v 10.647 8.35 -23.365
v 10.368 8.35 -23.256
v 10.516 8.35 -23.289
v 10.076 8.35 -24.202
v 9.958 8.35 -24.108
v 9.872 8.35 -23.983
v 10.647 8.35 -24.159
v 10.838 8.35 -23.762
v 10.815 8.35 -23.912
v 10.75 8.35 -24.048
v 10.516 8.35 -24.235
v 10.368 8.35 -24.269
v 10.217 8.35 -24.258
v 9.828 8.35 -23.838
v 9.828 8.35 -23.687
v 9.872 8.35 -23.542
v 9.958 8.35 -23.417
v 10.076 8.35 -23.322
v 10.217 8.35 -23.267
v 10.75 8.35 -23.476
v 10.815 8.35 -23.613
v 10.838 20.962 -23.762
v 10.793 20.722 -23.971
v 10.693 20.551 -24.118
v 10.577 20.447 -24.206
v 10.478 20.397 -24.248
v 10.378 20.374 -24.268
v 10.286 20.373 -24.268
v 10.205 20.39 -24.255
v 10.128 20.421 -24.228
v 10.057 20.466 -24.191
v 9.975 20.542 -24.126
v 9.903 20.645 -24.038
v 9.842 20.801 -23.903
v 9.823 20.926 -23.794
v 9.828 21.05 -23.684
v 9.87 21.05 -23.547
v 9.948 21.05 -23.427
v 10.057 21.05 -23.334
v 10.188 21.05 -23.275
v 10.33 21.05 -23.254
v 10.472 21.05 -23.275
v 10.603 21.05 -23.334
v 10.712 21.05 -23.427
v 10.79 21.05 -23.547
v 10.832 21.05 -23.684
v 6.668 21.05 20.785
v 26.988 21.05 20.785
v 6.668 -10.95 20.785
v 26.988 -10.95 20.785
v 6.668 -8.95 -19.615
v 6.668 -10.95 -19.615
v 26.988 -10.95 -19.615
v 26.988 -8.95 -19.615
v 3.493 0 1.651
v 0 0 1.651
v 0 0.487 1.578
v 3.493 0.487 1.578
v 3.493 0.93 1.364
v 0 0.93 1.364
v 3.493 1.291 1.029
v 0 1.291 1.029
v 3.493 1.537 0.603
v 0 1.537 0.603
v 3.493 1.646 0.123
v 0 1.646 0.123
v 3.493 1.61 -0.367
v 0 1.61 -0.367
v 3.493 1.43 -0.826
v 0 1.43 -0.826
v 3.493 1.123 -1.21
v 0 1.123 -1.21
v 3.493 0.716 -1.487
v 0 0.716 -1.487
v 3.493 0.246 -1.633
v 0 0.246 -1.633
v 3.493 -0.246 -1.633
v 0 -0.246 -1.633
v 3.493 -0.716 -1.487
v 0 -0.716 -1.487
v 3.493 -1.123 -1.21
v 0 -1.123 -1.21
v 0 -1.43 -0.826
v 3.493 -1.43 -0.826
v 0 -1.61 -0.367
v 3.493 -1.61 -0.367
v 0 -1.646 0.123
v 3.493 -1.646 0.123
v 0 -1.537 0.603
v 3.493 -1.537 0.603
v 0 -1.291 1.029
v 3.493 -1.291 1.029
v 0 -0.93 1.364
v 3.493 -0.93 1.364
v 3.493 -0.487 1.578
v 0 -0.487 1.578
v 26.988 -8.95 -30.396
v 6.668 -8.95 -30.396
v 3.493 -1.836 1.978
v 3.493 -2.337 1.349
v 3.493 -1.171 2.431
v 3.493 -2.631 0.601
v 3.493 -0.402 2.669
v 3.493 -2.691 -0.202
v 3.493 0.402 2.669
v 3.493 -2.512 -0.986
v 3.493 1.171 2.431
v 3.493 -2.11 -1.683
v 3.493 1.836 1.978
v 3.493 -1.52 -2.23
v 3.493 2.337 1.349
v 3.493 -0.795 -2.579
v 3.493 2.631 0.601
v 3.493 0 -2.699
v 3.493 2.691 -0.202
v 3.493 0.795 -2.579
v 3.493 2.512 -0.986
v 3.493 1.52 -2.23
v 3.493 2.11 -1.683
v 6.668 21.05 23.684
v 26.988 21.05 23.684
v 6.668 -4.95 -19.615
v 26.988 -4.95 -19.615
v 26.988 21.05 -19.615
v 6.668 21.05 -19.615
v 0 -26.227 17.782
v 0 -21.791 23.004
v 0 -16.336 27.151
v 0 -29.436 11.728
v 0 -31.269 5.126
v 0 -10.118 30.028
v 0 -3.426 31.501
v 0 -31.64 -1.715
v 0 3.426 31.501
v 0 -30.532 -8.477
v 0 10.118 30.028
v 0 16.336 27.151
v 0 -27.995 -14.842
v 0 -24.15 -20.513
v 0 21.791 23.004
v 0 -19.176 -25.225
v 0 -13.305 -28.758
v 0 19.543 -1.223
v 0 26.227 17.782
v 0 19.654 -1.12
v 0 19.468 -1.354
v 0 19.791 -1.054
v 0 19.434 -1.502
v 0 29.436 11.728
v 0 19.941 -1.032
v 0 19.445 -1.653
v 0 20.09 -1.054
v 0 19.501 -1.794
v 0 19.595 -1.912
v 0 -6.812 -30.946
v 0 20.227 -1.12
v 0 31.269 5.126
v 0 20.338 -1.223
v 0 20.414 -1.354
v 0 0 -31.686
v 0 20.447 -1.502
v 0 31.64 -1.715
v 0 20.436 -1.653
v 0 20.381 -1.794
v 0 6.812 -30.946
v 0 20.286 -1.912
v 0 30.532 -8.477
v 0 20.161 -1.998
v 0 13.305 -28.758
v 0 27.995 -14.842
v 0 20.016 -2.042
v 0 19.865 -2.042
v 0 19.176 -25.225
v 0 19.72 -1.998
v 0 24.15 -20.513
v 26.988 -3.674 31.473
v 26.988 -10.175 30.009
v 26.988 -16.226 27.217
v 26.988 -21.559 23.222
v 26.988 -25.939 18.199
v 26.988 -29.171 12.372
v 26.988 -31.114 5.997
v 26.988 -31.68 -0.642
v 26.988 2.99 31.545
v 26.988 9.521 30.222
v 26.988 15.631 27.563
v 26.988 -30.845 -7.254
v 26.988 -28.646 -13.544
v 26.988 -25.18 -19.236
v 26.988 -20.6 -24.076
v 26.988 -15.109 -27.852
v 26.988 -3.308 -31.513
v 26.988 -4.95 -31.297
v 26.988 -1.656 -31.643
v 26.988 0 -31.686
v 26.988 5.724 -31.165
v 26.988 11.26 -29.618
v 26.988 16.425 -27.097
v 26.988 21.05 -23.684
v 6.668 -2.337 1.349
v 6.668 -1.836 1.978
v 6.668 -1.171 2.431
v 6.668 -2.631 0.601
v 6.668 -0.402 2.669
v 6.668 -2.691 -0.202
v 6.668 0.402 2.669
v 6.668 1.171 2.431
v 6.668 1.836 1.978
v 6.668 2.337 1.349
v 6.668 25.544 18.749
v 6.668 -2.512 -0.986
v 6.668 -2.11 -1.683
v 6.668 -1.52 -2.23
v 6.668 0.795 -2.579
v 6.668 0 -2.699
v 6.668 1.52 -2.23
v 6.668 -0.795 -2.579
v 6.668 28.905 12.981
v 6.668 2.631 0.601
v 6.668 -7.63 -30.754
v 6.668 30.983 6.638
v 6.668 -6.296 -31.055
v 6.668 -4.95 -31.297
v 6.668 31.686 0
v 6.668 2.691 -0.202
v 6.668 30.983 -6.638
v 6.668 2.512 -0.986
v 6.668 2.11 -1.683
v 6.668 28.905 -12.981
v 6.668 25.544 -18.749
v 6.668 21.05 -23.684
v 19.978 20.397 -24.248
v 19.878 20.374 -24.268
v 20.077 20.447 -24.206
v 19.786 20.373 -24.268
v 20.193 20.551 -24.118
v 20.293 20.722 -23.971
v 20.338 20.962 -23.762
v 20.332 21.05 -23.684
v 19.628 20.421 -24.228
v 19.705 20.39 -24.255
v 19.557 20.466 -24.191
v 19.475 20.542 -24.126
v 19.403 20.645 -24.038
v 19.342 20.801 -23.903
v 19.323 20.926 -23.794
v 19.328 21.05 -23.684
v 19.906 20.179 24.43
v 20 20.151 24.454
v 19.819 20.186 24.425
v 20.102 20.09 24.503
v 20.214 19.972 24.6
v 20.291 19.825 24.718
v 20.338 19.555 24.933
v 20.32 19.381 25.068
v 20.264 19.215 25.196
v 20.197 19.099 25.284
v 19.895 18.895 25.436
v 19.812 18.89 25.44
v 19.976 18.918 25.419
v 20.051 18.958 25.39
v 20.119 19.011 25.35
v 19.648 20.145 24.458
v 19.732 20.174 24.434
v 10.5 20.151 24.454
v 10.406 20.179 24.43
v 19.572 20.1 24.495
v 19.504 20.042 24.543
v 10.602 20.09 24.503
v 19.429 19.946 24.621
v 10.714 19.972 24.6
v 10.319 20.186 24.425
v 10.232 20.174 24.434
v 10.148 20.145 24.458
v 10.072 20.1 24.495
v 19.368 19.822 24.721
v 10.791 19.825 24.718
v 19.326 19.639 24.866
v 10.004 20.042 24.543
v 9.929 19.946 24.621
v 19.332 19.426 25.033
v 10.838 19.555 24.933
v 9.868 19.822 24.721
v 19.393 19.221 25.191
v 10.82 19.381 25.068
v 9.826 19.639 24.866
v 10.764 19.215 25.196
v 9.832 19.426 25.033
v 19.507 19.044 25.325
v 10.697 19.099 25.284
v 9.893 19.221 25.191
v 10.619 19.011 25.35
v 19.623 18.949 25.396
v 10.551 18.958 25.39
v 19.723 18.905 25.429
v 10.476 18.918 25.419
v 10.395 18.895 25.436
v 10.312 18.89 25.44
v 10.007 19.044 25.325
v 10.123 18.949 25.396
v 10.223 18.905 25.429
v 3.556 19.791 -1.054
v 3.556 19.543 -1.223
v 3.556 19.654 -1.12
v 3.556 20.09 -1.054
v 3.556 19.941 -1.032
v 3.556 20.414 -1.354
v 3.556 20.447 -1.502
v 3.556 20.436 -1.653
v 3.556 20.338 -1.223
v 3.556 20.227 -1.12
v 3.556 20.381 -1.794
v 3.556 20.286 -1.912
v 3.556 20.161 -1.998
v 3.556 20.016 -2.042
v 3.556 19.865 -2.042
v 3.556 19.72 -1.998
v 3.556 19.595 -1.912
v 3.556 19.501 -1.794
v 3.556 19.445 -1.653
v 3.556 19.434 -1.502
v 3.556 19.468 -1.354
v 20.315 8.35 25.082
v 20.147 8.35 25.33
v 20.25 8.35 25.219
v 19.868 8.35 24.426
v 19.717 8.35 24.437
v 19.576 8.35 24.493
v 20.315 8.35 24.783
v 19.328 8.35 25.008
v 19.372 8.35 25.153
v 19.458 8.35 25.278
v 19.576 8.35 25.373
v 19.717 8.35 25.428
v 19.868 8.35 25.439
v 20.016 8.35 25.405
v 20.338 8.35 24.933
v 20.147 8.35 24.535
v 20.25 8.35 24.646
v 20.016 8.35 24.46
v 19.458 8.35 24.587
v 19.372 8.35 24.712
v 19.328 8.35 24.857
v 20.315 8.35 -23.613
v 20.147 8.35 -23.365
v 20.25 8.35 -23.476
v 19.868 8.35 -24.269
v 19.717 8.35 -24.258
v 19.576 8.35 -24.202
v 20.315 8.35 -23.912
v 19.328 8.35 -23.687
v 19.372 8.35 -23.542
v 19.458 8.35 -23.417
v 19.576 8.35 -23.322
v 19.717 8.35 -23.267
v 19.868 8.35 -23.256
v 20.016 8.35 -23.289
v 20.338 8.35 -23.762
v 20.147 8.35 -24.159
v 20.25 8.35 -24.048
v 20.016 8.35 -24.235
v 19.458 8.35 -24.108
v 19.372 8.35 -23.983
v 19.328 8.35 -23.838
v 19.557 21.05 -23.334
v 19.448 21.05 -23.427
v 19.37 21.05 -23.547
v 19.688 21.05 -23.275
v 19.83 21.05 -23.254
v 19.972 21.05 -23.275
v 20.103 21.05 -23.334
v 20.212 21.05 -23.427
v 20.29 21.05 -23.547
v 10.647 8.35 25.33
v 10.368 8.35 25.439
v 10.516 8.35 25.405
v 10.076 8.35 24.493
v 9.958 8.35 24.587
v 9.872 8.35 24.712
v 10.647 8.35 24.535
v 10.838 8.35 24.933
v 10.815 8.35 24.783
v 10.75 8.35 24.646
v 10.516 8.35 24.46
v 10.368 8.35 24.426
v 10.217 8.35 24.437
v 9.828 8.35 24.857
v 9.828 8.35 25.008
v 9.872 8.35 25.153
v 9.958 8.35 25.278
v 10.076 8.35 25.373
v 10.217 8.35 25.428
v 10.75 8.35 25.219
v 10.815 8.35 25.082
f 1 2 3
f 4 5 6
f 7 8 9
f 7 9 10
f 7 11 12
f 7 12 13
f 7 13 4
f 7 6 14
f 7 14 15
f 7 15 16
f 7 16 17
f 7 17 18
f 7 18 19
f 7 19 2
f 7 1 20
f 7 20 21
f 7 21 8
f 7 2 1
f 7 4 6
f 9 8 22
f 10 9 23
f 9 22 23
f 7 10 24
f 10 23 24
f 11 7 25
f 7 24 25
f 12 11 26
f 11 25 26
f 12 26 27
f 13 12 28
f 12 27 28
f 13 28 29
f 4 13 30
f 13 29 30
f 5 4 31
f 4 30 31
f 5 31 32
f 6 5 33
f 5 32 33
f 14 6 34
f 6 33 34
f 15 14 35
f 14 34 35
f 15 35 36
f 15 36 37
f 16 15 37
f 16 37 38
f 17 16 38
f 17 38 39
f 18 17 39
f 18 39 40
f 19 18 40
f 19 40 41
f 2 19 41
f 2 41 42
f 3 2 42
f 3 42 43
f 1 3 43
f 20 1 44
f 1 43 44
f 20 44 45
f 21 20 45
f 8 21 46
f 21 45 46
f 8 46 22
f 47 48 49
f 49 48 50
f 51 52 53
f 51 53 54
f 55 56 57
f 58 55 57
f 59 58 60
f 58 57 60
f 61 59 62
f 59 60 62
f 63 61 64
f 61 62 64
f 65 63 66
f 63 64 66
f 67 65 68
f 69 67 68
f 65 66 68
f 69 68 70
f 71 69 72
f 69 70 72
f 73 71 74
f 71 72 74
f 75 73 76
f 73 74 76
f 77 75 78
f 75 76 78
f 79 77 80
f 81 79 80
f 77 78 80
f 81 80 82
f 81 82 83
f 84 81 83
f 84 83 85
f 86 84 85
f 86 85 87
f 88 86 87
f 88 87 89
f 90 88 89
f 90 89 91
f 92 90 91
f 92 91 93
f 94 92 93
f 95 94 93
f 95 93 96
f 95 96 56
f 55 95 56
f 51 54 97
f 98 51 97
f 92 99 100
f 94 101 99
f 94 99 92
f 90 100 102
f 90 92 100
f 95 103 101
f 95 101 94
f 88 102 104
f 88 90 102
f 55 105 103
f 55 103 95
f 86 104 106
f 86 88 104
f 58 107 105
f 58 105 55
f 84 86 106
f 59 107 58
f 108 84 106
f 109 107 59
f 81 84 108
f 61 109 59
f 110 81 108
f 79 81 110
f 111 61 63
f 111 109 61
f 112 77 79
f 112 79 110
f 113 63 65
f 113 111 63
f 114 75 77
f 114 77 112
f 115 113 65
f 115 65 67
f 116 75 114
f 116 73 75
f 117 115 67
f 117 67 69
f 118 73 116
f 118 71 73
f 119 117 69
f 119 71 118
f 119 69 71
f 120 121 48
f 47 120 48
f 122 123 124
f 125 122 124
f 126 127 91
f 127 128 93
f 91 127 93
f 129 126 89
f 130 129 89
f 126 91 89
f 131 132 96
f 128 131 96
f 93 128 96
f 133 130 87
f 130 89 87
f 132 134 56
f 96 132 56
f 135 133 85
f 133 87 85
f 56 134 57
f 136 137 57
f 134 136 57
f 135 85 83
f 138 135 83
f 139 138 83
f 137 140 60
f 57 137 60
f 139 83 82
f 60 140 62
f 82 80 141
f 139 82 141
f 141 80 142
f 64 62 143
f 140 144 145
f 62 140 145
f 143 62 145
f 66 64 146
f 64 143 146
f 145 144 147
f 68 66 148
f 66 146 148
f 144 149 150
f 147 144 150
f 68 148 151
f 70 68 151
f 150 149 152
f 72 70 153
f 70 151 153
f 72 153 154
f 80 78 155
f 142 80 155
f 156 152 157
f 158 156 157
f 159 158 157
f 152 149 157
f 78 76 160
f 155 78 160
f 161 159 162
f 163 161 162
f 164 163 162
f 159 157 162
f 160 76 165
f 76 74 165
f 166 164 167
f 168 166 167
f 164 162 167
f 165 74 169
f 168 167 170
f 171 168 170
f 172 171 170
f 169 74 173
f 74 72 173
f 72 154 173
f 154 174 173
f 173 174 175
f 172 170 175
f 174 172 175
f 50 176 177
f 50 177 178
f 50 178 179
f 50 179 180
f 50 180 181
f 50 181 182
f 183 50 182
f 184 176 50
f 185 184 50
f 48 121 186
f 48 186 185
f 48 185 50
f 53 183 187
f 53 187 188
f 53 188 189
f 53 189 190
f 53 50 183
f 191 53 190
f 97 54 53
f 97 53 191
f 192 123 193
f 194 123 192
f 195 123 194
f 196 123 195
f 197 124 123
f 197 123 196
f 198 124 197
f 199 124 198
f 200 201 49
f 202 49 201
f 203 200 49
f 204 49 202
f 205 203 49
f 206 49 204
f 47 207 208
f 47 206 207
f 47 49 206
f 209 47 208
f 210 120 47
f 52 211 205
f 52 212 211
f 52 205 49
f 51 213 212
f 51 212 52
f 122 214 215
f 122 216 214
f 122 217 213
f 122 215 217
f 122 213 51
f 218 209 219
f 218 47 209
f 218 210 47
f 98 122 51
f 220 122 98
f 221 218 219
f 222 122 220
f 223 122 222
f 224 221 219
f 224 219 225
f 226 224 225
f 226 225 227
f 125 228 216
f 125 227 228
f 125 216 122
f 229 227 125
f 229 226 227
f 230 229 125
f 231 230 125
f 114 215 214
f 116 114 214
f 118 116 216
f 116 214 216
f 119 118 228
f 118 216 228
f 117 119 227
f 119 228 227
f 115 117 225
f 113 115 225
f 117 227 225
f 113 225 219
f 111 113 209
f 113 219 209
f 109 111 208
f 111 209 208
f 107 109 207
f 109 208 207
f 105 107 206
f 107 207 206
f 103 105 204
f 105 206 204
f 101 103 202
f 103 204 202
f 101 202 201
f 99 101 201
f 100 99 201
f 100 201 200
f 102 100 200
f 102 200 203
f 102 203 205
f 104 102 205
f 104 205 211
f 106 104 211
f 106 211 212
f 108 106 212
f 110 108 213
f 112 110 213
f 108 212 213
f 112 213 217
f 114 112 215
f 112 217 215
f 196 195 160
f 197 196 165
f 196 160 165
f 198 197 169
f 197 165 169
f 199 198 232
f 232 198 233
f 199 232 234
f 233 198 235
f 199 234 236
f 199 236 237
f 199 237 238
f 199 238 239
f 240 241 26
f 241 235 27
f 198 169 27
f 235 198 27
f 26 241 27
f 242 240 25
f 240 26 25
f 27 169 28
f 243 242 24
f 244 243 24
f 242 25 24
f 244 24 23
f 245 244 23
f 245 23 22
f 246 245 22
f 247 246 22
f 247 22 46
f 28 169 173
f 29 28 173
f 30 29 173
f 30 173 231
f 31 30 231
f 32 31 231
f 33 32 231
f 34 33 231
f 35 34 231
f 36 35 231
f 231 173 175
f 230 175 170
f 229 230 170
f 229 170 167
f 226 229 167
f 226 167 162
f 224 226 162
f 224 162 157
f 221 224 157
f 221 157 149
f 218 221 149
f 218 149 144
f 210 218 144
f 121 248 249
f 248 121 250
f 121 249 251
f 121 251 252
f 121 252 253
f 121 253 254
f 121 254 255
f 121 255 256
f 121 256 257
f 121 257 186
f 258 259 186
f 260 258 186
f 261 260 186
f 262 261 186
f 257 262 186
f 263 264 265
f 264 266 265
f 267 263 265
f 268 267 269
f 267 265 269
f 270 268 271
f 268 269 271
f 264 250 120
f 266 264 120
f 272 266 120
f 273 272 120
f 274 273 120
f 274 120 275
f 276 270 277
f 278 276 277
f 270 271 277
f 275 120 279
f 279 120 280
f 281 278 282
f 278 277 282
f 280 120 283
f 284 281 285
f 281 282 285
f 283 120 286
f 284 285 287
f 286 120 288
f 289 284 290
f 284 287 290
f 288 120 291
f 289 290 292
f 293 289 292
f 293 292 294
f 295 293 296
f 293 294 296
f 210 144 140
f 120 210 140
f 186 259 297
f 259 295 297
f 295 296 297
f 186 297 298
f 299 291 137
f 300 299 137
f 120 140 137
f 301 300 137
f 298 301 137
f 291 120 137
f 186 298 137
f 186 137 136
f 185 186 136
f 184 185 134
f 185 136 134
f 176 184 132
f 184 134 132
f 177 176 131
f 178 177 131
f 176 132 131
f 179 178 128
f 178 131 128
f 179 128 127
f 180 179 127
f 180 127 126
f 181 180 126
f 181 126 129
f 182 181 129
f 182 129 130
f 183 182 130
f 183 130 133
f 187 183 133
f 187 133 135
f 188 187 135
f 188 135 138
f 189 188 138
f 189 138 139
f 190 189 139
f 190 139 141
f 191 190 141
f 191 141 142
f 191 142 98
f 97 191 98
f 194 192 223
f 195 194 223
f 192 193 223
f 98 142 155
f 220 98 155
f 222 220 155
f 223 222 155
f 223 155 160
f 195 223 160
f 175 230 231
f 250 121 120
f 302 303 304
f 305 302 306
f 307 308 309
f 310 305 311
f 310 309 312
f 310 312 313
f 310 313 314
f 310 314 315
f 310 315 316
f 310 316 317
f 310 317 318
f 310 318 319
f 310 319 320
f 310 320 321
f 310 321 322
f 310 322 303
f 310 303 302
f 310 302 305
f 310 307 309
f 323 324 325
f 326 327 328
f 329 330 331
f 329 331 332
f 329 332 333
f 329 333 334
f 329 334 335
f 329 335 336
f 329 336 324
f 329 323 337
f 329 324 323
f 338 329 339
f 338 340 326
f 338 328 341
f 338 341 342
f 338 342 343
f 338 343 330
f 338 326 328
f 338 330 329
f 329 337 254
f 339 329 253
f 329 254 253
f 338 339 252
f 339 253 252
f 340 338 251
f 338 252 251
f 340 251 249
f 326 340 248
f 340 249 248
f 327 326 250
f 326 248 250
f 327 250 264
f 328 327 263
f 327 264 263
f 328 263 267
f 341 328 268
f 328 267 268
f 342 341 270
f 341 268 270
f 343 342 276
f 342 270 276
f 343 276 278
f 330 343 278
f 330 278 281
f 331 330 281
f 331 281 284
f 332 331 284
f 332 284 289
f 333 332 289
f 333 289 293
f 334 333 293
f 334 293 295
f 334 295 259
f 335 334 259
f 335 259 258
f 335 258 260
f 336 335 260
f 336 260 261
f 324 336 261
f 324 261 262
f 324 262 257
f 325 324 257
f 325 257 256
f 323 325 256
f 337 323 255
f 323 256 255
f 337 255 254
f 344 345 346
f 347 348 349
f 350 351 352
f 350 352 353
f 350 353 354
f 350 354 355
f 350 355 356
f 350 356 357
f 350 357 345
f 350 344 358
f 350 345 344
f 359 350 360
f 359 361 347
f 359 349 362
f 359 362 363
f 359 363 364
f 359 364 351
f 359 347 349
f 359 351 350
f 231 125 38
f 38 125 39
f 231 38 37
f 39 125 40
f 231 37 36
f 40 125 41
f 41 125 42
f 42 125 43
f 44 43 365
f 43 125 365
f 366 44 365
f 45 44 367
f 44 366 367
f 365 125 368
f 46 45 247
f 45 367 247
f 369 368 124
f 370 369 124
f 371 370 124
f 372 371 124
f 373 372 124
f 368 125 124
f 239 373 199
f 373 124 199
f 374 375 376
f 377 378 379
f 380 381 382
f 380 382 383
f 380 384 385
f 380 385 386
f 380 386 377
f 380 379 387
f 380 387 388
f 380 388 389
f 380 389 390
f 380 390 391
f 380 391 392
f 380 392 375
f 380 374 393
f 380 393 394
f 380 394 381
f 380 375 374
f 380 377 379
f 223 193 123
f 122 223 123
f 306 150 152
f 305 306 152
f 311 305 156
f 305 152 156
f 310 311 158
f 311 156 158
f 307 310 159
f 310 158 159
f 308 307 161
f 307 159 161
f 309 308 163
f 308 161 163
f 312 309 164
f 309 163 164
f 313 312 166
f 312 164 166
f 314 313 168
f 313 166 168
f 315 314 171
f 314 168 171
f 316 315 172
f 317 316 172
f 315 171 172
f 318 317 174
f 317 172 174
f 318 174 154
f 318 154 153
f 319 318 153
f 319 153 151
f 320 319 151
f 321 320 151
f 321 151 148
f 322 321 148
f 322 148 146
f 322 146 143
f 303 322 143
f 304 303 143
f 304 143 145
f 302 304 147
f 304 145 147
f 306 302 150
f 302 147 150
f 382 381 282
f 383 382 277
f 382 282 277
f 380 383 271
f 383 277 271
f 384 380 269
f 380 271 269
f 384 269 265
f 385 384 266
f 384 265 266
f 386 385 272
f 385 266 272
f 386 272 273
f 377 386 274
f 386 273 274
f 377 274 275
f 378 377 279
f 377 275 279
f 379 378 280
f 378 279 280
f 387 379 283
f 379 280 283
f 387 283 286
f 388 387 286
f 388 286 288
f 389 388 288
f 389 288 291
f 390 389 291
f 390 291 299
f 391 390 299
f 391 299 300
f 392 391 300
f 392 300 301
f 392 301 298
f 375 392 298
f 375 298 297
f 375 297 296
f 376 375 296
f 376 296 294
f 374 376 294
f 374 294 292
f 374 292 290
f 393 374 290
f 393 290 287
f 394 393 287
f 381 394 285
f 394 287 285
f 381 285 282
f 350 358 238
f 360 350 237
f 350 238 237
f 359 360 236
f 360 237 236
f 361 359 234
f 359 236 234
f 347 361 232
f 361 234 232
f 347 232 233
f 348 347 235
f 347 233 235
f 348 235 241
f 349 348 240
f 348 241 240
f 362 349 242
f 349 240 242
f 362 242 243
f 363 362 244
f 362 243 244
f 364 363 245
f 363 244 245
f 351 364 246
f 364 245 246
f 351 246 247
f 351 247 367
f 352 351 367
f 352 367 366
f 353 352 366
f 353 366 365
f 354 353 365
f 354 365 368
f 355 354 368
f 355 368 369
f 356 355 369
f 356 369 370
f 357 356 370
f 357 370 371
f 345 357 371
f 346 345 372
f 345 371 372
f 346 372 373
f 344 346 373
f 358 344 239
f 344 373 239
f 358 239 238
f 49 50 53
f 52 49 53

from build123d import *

# Parameters (mm, degrees)
SKETCH1_R           = 31.6865
BOSS_EXTRUDE1_DEPTH = 26.9875
CUT_EXTRUDE1_DEPTH  = 20.32
SKETCH5_R           = 0.508
CUT_EXTRUDE2_DEPTH  = 12.7
SKETCH6_R           = 0.508
CUT_EXTRUDE3_DEPTH  = 3.556
SKETCH7_R           = 2.69875
BOSS_EXTRUDE2_DEPTH = 3.175
SKETCH11_R          = 2.69875
CUT_EXTRUDE6_DEPTH  = 3.175
SKETCH12_R          = 1.651
CUT_EXTRUDE7_DEPTH  = 9.017


with BuildPart() as part:
    # Sketch1 → Boss-Extrude1 (new body)
    with BuildSketch(Plane(origin=(0, 0, 0), x_dir=(0, 0, -1), z_dir=(1, 0, 0))):
        Circle(SKETCH1_R)
    extrude(amount=BOSS_EXTRUDE1_DEPTH)

    # Sketch3 → Cut-Extrude1 (cut)
    with BuildSketch(Plane(origin=(26.9875, 0, 0), x_dir=(0, 0, -1), z_dir=(1, 0, 0))):
        with BuildLine():
            Line((19.614864522, -8.95), (30.396246187, -8.95))
            ThreePointArc((30.396246187, -8.95), (30.911627748, -6.964592752), (31.297472458, -4.95))
            Line((31.297472458, -4.95), (19.614864522, -4.95))
            Line((19.614864522, -4.95), (19.614864522, 21.05))
            Line((19.614864522, 21.05), (23.683998443, 21.05))
            ThreePointArc((23.683998443, 21.05), (0, 31.6865), (-23.683998443, 21.05))
            Line((-23.683998443, 21.05), (-20.785135478, 21.05))
            Line((-20.785135478, 21.05), (-20.785135478, -10.95))
            Line((-20.785135478, -10.95), (19.614864522, -10.95))
            Line((19.614864522, -10.95), (19.614864522, -8.95))
        make_face()
    extrude(amount=-CUT_EXTRUDE1_DEPTH, mode=Mode.SUBTRACT)

    # Sketch5 → Cut-Extrude2 (cut)
    with BuildSketch(Plane(origin=(0, 21.05, 0), x_dir=(1, 0, 0), z_dir=(0, 1, 0))):
        with Locations((10.33, -24.932573059)):
            Circle(SKETCH5_R)
        with Locations((19.83, -24.932573059)):
            Circle(SKETCH5_R)
        with Locations((10.33, 23.762302103)):
            Circle(SKETCH5_R)
        with Locations((19.83, 23.762302103)):
            Circle(SKETCH5_R)
    extrude(amount=-CUT_EXTRUDE2_DEPTH, mode=Mode.SUBTRACT)

    # Sketch6 → Cut-Extrude3 (cut)
    with BuildSketch(Plane.ZY):
        with Locations((-1.539927539, 19.940627452)):
            Circle(SKETCH6_R)
    extrude(amount=-CUT_EXTRUDE3_DEPTH, mode=Mode.SUBTRACT)

    # Sketch7 → Boss-Extrude2 (add)
    with BuildSketch(Plane(origin=(6.6675, 0, 0), x_dir=(0, 0, -1), z_dir=(1, 0, 0))):
        Circle(SKETCH7_R)
    extrude(amount=-BOSS_EXTRUDE2_DEPTH)

    # Sketch11 → Cut-Extrude6 (cut)
    with BuildSketch(Plane(origin=(6.6675, 0, 0), x_dir=(0, 0, -1), z_dir=(1, 0, 0))):
        Circle(SKETCH11_R)
    extrude(amount=-CUT_EXTRUDE6_DEPTH, mode=Mode.SUBTRACT)

    # Sketch12 → Cut-Extrude7 (cut)
    with BuildSketch(Plane.ZY):
        Circle(SKETCH12_R)
    extrude(amount=-CUT_EXTRUDE7_DEPTH, mode=Mode.SUBTRACT)


solid = part.part
